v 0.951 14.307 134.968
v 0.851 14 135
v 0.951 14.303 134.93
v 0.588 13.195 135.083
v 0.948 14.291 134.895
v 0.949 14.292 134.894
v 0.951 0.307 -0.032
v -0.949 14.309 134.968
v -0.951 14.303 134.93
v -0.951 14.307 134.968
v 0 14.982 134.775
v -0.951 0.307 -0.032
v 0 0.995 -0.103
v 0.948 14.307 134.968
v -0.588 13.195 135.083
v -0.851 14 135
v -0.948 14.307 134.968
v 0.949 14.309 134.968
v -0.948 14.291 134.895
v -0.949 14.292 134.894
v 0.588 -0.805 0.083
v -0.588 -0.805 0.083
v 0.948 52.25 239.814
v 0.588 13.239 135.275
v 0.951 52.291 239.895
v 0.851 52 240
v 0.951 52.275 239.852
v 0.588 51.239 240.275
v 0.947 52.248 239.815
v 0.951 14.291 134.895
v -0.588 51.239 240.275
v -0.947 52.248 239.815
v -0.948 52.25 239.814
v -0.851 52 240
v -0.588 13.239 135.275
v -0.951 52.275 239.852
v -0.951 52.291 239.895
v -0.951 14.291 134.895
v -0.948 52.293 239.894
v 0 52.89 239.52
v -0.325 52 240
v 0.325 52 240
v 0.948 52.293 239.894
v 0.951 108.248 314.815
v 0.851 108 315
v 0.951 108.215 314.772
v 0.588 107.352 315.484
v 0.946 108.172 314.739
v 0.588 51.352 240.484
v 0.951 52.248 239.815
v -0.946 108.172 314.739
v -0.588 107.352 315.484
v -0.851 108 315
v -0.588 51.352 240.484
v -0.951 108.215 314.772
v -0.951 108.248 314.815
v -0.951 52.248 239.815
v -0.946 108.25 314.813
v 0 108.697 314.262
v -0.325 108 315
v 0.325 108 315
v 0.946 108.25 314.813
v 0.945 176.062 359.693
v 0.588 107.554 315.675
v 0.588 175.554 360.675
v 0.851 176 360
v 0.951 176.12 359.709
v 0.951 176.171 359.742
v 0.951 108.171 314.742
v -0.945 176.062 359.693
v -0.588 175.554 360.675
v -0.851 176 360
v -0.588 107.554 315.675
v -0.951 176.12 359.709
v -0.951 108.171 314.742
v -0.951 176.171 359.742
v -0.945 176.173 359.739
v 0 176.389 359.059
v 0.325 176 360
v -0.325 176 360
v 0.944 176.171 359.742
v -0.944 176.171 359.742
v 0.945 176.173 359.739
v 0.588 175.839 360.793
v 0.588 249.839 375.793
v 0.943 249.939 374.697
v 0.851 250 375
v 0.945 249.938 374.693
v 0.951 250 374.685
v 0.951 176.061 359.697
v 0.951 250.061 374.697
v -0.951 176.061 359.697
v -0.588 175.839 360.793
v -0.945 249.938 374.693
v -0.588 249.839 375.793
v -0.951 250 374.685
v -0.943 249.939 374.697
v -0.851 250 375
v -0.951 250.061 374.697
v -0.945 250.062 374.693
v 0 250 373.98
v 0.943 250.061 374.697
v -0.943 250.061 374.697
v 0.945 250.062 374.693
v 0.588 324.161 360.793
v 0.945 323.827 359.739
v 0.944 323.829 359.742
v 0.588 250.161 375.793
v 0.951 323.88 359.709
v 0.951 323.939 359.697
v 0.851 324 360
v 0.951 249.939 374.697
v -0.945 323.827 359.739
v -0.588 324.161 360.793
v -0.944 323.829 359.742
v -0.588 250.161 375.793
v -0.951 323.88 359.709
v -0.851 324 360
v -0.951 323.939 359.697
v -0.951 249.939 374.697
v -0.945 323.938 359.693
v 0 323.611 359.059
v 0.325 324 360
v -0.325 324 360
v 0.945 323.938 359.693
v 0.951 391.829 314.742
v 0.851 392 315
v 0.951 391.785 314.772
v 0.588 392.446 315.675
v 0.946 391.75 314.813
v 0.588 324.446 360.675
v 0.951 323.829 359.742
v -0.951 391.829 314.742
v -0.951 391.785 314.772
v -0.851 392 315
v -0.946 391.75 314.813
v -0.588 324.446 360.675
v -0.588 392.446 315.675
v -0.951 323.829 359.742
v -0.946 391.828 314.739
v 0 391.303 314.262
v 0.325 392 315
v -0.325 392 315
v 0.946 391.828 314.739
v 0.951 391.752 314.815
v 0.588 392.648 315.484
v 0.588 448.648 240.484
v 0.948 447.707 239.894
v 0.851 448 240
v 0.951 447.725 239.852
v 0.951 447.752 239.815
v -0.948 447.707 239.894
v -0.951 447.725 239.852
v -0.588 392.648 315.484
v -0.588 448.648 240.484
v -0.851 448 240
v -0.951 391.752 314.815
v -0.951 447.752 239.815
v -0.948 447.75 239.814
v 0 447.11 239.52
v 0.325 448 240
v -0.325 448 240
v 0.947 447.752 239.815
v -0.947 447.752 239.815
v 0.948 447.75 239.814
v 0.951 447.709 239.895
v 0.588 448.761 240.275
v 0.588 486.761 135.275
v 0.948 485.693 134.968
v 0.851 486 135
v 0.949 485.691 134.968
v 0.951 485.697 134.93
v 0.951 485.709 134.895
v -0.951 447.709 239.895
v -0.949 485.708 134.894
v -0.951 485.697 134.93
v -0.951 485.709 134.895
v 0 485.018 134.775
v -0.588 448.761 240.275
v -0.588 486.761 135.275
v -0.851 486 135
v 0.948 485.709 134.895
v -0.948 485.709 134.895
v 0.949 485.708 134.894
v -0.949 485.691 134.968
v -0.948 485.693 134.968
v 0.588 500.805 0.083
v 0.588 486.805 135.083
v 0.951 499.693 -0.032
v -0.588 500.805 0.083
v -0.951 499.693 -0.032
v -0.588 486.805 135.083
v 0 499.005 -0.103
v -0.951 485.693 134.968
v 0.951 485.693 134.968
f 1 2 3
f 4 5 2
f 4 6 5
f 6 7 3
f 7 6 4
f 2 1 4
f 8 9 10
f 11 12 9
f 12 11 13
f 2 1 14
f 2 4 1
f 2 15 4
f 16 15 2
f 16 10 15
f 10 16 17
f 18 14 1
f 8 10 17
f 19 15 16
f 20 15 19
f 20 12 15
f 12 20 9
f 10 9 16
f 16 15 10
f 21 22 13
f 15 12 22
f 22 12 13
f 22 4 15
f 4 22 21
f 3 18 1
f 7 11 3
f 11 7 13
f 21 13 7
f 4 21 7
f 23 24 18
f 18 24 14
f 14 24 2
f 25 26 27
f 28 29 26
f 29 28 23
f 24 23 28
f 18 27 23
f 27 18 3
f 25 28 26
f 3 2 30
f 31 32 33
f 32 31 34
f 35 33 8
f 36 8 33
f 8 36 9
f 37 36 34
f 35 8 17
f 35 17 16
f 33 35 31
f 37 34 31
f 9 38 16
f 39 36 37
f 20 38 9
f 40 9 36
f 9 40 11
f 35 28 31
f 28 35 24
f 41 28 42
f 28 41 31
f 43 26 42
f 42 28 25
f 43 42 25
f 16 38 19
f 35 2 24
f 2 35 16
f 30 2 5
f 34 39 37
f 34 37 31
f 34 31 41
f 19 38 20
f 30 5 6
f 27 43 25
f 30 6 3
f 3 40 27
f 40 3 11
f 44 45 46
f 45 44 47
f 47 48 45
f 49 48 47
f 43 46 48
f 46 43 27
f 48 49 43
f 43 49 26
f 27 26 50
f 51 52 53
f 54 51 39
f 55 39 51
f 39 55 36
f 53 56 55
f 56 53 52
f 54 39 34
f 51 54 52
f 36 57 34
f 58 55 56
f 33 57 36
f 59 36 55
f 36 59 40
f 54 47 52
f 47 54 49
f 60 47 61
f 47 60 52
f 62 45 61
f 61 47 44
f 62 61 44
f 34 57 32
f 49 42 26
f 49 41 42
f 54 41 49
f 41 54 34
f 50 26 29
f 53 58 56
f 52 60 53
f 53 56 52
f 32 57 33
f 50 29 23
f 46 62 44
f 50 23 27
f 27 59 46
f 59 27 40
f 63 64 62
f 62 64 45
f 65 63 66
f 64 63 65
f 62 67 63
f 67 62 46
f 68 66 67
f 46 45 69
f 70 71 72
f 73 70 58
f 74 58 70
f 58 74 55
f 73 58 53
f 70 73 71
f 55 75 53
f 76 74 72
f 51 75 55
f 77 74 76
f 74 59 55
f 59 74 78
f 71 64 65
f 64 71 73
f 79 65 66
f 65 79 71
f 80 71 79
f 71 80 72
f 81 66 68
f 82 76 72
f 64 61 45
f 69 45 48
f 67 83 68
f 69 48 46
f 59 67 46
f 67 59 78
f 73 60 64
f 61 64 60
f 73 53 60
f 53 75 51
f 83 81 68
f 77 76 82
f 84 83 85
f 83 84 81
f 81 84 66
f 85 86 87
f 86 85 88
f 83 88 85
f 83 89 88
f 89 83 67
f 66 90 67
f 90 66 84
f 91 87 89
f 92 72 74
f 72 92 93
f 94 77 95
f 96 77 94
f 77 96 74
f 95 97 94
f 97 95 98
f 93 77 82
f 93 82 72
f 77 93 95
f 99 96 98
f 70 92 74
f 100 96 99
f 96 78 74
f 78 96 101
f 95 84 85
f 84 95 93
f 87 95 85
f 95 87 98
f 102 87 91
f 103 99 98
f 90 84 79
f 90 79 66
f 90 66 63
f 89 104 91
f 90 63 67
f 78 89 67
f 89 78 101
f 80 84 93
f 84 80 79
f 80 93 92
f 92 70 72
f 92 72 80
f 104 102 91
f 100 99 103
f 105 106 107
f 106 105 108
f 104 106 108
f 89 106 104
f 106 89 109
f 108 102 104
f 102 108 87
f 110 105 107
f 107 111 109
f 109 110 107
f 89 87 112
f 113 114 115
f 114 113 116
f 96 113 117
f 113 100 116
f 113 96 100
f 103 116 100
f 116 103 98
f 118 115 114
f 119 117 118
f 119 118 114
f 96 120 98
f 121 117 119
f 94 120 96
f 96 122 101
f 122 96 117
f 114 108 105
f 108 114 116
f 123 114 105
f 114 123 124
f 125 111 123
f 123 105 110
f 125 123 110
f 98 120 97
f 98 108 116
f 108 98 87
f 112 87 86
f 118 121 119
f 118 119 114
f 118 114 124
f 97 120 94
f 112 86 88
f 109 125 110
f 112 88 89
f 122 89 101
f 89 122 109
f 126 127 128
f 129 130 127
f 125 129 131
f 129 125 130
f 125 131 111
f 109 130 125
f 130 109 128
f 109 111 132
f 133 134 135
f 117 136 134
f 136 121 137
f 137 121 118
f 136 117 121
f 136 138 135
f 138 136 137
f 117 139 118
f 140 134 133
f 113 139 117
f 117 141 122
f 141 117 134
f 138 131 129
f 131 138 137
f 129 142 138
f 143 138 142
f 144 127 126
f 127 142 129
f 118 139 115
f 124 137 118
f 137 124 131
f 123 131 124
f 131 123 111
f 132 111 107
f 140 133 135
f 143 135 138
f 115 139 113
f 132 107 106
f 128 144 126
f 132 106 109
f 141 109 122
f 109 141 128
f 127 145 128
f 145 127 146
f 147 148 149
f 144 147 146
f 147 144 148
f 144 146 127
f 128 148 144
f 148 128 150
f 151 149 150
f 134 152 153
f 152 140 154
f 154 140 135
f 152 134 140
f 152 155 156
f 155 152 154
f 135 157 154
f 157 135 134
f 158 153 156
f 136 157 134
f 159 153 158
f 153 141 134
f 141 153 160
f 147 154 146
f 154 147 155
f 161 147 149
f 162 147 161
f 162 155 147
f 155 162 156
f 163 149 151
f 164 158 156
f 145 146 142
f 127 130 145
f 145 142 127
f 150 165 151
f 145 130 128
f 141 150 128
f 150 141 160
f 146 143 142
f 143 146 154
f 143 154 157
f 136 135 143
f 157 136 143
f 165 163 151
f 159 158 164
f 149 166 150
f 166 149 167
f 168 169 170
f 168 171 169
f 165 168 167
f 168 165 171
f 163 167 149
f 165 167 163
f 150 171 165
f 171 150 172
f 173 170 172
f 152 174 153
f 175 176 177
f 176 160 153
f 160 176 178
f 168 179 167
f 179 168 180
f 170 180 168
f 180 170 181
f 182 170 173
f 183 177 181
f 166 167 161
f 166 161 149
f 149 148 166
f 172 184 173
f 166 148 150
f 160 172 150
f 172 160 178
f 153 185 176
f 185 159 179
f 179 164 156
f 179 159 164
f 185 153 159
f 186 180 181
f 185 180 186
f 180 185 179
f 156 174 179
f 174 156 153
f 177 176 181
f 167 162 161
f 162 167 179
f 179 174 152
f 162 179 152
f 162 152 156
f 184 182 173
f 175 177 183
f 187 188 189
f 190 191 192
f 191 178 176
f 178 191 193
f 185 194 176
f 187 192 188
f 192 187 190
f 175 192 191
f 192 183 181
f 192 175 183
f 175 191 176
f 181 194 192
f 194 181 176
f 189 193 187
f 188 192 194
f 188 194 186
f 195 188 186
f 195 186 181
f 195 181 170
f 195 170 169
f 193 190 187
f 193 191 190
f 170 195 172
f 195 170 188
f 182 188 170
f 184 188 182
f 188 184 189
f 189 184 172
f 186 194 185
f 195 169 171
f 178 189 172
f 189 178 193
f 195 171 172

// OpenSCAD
// file: machine.scad
/*
 * Helpers for machinging; i.e. kerf alowances
 *
 * Copyright 2013 <b@Zi.iS>
 * License CC BY 3.0
 */

ZCUT = 0;
XOFF = 0;
YOFF = 0;

module drawing() {
	//create blueprint
	if(preview==0) {
		projection(cut=true) translate([
			XOFF,
			YOFF,
			ZCUT
		]) {
            if($children) children([0:$children-1]);
		}
	} else {
        if($children) children([0:$children-1]);
	}
}

module kerf_cube(
	size
) {
	translate([
		kerf/2*(1-preview),
		kerf/2*(1-preview),
		0
	]) {
		cube([
			size[0] - kerf*(1-preview),
			size[1] - kerf*(1-preview),
			size[2]
		]);
	}
}

module kerf_cylinder(
	r,
	h
) {
	cylinder(
		r = r - kerf/2*(1-preview),
		h = h
	);
}

module part(
	id,
	name
) {
	if(PART<1 || PART==id || id<0) {
		if(id>=0) echo(str("PART", id, ":", name));
        if($children) children([0:$children-1]);
	}	
}
// file: easing.scad
/*
 * Make allowances to ensure good fit.
 *
 * Copyright 2013 <b@Zi.iS>
 * License CC BY 3.0
 */

function ease(value) = min(value*1.1, value + .2);
// file: epslion.scad
/*
 * Slightly offset previews to overcome rounding issues
 *
 * Copyright 2013 <b@Zi.iS>
 * License CC BY 3.0
 */

include <config.scad>;

module e(
	shift = -.1,
	size = 1.1
) {
	if(preview == 1) {
		translate([
			0,
			0,
			shift
		]) {
			scale([
				1,
				1,
				size
			]) {
                if($children) children([0:$children-1]);
			}
		}
	} else {
        if($children) children([0:$children-1]);
	}
}

function space(pitch, i) = -pitch/2 + pitch*i;
// file: config.scad
/*
 * Default settings
 *
 * Copyright 2013 <b@Zi.iS>
 * License CC BY 3.0
 */

preview = 1;
$fa = 6;
$fs = 2 - 1.5*(1-preview);
kerf = .3;
PART = 0; //all

// preview colors
color_steel = [.8, .8, .8];
color_wood = [.3, .3, 0];
color_print = [0, .8, 0];
color_plastic = [.7, 1, .7];
color_brass = [181/255, 166/255, 66/255];
color_acrylic = [.9,.9,.9,.5];
// file: main.scad
/*
 * A library to make SCAD easier.
 *
 * Copyright 2013 <b@Zi.iS>
 * License CC BY 3.0
 */

include <config.scad>;
use <epslion.scad>;
use <easing.scad>;
include <machine.scad>;
// main file
/*
 * Bend unit length child along a Bézier curve
 *
 * Copyright 2013 William Adams, <b@Zi.iS>
 * License CC BY 3.0
 */
include <main.scad>;

bend([0, 500, 0], 1000) {
    cylinder(r=1, h=1);
}

module bend(
	end = [0, 40, 0],
	length = 100,
	steps = 10,
	debug = 0
) {
	span = sqrt(end*end);

	//aprox. a constant length
   c = [
		[0, 0, 0],
		[0, 0, (length-span)],
		[end[0], end[1], end[2] + (length-span)],
		end
   ];

	if(debug) {
		for(point=[0:3]) {
			translate(c[point]) {
				color([1,0,0]) {
					cylinder(r=1, h=1);
				}
			}
		}
	}

	for(step = [steps-1:0]) {
		cylinder_between(
			PointAlongBez4(c[0], c[1], c[2], c[3], step/(steps)),
			PointAlongBez4(c[0], c[1], c[2], c[3], (step+1)/(steps))
		) children(0);
	}
}

function BEZ03(u) = pow((1-u), 3);
function BEZ13(u) = 3*u*(pow((1-u),2));
function BEZ23(u) = 3*(pow(u,2))*(1-u);
function BEZ33(u) = pow(u,3);

function PointAlongBez4(p0, p1, p2, p3, u) = [
	BEZ03(u)*p0[0] + BEZ13(u)*p1[0] + BEZ23(u)*p2[0] + BEZ33(u)*p3[0],
	BEZ03(u)*p0[1] + BEZ13(u)*p1[1] + BEZ23(u)*p2[1] + BEZ33(u)*p3[1],
	BEZ03(u)*p0[2] + BEZ13(u)*p1[2] + BEZ23(u)*p2[2] + BEZ33(u)*p3[2]
];

module cylinder_between(p1, p2) {
	v = p2 - p1;
	translate(p1) {
		rotate([
			0,
			0,
			atan2(v[1], v[0])
		]) {
			rotate([
				0,
				atan2(
					sqrt(pow(v[0], 2) + pow(v[1], 2)),
					v[2]
				),
				0
			]) {
				scale([
					1,
					1,
					sqrt(v*v)
				]) {
					children(0);
				}
			}
		}
	}
}
